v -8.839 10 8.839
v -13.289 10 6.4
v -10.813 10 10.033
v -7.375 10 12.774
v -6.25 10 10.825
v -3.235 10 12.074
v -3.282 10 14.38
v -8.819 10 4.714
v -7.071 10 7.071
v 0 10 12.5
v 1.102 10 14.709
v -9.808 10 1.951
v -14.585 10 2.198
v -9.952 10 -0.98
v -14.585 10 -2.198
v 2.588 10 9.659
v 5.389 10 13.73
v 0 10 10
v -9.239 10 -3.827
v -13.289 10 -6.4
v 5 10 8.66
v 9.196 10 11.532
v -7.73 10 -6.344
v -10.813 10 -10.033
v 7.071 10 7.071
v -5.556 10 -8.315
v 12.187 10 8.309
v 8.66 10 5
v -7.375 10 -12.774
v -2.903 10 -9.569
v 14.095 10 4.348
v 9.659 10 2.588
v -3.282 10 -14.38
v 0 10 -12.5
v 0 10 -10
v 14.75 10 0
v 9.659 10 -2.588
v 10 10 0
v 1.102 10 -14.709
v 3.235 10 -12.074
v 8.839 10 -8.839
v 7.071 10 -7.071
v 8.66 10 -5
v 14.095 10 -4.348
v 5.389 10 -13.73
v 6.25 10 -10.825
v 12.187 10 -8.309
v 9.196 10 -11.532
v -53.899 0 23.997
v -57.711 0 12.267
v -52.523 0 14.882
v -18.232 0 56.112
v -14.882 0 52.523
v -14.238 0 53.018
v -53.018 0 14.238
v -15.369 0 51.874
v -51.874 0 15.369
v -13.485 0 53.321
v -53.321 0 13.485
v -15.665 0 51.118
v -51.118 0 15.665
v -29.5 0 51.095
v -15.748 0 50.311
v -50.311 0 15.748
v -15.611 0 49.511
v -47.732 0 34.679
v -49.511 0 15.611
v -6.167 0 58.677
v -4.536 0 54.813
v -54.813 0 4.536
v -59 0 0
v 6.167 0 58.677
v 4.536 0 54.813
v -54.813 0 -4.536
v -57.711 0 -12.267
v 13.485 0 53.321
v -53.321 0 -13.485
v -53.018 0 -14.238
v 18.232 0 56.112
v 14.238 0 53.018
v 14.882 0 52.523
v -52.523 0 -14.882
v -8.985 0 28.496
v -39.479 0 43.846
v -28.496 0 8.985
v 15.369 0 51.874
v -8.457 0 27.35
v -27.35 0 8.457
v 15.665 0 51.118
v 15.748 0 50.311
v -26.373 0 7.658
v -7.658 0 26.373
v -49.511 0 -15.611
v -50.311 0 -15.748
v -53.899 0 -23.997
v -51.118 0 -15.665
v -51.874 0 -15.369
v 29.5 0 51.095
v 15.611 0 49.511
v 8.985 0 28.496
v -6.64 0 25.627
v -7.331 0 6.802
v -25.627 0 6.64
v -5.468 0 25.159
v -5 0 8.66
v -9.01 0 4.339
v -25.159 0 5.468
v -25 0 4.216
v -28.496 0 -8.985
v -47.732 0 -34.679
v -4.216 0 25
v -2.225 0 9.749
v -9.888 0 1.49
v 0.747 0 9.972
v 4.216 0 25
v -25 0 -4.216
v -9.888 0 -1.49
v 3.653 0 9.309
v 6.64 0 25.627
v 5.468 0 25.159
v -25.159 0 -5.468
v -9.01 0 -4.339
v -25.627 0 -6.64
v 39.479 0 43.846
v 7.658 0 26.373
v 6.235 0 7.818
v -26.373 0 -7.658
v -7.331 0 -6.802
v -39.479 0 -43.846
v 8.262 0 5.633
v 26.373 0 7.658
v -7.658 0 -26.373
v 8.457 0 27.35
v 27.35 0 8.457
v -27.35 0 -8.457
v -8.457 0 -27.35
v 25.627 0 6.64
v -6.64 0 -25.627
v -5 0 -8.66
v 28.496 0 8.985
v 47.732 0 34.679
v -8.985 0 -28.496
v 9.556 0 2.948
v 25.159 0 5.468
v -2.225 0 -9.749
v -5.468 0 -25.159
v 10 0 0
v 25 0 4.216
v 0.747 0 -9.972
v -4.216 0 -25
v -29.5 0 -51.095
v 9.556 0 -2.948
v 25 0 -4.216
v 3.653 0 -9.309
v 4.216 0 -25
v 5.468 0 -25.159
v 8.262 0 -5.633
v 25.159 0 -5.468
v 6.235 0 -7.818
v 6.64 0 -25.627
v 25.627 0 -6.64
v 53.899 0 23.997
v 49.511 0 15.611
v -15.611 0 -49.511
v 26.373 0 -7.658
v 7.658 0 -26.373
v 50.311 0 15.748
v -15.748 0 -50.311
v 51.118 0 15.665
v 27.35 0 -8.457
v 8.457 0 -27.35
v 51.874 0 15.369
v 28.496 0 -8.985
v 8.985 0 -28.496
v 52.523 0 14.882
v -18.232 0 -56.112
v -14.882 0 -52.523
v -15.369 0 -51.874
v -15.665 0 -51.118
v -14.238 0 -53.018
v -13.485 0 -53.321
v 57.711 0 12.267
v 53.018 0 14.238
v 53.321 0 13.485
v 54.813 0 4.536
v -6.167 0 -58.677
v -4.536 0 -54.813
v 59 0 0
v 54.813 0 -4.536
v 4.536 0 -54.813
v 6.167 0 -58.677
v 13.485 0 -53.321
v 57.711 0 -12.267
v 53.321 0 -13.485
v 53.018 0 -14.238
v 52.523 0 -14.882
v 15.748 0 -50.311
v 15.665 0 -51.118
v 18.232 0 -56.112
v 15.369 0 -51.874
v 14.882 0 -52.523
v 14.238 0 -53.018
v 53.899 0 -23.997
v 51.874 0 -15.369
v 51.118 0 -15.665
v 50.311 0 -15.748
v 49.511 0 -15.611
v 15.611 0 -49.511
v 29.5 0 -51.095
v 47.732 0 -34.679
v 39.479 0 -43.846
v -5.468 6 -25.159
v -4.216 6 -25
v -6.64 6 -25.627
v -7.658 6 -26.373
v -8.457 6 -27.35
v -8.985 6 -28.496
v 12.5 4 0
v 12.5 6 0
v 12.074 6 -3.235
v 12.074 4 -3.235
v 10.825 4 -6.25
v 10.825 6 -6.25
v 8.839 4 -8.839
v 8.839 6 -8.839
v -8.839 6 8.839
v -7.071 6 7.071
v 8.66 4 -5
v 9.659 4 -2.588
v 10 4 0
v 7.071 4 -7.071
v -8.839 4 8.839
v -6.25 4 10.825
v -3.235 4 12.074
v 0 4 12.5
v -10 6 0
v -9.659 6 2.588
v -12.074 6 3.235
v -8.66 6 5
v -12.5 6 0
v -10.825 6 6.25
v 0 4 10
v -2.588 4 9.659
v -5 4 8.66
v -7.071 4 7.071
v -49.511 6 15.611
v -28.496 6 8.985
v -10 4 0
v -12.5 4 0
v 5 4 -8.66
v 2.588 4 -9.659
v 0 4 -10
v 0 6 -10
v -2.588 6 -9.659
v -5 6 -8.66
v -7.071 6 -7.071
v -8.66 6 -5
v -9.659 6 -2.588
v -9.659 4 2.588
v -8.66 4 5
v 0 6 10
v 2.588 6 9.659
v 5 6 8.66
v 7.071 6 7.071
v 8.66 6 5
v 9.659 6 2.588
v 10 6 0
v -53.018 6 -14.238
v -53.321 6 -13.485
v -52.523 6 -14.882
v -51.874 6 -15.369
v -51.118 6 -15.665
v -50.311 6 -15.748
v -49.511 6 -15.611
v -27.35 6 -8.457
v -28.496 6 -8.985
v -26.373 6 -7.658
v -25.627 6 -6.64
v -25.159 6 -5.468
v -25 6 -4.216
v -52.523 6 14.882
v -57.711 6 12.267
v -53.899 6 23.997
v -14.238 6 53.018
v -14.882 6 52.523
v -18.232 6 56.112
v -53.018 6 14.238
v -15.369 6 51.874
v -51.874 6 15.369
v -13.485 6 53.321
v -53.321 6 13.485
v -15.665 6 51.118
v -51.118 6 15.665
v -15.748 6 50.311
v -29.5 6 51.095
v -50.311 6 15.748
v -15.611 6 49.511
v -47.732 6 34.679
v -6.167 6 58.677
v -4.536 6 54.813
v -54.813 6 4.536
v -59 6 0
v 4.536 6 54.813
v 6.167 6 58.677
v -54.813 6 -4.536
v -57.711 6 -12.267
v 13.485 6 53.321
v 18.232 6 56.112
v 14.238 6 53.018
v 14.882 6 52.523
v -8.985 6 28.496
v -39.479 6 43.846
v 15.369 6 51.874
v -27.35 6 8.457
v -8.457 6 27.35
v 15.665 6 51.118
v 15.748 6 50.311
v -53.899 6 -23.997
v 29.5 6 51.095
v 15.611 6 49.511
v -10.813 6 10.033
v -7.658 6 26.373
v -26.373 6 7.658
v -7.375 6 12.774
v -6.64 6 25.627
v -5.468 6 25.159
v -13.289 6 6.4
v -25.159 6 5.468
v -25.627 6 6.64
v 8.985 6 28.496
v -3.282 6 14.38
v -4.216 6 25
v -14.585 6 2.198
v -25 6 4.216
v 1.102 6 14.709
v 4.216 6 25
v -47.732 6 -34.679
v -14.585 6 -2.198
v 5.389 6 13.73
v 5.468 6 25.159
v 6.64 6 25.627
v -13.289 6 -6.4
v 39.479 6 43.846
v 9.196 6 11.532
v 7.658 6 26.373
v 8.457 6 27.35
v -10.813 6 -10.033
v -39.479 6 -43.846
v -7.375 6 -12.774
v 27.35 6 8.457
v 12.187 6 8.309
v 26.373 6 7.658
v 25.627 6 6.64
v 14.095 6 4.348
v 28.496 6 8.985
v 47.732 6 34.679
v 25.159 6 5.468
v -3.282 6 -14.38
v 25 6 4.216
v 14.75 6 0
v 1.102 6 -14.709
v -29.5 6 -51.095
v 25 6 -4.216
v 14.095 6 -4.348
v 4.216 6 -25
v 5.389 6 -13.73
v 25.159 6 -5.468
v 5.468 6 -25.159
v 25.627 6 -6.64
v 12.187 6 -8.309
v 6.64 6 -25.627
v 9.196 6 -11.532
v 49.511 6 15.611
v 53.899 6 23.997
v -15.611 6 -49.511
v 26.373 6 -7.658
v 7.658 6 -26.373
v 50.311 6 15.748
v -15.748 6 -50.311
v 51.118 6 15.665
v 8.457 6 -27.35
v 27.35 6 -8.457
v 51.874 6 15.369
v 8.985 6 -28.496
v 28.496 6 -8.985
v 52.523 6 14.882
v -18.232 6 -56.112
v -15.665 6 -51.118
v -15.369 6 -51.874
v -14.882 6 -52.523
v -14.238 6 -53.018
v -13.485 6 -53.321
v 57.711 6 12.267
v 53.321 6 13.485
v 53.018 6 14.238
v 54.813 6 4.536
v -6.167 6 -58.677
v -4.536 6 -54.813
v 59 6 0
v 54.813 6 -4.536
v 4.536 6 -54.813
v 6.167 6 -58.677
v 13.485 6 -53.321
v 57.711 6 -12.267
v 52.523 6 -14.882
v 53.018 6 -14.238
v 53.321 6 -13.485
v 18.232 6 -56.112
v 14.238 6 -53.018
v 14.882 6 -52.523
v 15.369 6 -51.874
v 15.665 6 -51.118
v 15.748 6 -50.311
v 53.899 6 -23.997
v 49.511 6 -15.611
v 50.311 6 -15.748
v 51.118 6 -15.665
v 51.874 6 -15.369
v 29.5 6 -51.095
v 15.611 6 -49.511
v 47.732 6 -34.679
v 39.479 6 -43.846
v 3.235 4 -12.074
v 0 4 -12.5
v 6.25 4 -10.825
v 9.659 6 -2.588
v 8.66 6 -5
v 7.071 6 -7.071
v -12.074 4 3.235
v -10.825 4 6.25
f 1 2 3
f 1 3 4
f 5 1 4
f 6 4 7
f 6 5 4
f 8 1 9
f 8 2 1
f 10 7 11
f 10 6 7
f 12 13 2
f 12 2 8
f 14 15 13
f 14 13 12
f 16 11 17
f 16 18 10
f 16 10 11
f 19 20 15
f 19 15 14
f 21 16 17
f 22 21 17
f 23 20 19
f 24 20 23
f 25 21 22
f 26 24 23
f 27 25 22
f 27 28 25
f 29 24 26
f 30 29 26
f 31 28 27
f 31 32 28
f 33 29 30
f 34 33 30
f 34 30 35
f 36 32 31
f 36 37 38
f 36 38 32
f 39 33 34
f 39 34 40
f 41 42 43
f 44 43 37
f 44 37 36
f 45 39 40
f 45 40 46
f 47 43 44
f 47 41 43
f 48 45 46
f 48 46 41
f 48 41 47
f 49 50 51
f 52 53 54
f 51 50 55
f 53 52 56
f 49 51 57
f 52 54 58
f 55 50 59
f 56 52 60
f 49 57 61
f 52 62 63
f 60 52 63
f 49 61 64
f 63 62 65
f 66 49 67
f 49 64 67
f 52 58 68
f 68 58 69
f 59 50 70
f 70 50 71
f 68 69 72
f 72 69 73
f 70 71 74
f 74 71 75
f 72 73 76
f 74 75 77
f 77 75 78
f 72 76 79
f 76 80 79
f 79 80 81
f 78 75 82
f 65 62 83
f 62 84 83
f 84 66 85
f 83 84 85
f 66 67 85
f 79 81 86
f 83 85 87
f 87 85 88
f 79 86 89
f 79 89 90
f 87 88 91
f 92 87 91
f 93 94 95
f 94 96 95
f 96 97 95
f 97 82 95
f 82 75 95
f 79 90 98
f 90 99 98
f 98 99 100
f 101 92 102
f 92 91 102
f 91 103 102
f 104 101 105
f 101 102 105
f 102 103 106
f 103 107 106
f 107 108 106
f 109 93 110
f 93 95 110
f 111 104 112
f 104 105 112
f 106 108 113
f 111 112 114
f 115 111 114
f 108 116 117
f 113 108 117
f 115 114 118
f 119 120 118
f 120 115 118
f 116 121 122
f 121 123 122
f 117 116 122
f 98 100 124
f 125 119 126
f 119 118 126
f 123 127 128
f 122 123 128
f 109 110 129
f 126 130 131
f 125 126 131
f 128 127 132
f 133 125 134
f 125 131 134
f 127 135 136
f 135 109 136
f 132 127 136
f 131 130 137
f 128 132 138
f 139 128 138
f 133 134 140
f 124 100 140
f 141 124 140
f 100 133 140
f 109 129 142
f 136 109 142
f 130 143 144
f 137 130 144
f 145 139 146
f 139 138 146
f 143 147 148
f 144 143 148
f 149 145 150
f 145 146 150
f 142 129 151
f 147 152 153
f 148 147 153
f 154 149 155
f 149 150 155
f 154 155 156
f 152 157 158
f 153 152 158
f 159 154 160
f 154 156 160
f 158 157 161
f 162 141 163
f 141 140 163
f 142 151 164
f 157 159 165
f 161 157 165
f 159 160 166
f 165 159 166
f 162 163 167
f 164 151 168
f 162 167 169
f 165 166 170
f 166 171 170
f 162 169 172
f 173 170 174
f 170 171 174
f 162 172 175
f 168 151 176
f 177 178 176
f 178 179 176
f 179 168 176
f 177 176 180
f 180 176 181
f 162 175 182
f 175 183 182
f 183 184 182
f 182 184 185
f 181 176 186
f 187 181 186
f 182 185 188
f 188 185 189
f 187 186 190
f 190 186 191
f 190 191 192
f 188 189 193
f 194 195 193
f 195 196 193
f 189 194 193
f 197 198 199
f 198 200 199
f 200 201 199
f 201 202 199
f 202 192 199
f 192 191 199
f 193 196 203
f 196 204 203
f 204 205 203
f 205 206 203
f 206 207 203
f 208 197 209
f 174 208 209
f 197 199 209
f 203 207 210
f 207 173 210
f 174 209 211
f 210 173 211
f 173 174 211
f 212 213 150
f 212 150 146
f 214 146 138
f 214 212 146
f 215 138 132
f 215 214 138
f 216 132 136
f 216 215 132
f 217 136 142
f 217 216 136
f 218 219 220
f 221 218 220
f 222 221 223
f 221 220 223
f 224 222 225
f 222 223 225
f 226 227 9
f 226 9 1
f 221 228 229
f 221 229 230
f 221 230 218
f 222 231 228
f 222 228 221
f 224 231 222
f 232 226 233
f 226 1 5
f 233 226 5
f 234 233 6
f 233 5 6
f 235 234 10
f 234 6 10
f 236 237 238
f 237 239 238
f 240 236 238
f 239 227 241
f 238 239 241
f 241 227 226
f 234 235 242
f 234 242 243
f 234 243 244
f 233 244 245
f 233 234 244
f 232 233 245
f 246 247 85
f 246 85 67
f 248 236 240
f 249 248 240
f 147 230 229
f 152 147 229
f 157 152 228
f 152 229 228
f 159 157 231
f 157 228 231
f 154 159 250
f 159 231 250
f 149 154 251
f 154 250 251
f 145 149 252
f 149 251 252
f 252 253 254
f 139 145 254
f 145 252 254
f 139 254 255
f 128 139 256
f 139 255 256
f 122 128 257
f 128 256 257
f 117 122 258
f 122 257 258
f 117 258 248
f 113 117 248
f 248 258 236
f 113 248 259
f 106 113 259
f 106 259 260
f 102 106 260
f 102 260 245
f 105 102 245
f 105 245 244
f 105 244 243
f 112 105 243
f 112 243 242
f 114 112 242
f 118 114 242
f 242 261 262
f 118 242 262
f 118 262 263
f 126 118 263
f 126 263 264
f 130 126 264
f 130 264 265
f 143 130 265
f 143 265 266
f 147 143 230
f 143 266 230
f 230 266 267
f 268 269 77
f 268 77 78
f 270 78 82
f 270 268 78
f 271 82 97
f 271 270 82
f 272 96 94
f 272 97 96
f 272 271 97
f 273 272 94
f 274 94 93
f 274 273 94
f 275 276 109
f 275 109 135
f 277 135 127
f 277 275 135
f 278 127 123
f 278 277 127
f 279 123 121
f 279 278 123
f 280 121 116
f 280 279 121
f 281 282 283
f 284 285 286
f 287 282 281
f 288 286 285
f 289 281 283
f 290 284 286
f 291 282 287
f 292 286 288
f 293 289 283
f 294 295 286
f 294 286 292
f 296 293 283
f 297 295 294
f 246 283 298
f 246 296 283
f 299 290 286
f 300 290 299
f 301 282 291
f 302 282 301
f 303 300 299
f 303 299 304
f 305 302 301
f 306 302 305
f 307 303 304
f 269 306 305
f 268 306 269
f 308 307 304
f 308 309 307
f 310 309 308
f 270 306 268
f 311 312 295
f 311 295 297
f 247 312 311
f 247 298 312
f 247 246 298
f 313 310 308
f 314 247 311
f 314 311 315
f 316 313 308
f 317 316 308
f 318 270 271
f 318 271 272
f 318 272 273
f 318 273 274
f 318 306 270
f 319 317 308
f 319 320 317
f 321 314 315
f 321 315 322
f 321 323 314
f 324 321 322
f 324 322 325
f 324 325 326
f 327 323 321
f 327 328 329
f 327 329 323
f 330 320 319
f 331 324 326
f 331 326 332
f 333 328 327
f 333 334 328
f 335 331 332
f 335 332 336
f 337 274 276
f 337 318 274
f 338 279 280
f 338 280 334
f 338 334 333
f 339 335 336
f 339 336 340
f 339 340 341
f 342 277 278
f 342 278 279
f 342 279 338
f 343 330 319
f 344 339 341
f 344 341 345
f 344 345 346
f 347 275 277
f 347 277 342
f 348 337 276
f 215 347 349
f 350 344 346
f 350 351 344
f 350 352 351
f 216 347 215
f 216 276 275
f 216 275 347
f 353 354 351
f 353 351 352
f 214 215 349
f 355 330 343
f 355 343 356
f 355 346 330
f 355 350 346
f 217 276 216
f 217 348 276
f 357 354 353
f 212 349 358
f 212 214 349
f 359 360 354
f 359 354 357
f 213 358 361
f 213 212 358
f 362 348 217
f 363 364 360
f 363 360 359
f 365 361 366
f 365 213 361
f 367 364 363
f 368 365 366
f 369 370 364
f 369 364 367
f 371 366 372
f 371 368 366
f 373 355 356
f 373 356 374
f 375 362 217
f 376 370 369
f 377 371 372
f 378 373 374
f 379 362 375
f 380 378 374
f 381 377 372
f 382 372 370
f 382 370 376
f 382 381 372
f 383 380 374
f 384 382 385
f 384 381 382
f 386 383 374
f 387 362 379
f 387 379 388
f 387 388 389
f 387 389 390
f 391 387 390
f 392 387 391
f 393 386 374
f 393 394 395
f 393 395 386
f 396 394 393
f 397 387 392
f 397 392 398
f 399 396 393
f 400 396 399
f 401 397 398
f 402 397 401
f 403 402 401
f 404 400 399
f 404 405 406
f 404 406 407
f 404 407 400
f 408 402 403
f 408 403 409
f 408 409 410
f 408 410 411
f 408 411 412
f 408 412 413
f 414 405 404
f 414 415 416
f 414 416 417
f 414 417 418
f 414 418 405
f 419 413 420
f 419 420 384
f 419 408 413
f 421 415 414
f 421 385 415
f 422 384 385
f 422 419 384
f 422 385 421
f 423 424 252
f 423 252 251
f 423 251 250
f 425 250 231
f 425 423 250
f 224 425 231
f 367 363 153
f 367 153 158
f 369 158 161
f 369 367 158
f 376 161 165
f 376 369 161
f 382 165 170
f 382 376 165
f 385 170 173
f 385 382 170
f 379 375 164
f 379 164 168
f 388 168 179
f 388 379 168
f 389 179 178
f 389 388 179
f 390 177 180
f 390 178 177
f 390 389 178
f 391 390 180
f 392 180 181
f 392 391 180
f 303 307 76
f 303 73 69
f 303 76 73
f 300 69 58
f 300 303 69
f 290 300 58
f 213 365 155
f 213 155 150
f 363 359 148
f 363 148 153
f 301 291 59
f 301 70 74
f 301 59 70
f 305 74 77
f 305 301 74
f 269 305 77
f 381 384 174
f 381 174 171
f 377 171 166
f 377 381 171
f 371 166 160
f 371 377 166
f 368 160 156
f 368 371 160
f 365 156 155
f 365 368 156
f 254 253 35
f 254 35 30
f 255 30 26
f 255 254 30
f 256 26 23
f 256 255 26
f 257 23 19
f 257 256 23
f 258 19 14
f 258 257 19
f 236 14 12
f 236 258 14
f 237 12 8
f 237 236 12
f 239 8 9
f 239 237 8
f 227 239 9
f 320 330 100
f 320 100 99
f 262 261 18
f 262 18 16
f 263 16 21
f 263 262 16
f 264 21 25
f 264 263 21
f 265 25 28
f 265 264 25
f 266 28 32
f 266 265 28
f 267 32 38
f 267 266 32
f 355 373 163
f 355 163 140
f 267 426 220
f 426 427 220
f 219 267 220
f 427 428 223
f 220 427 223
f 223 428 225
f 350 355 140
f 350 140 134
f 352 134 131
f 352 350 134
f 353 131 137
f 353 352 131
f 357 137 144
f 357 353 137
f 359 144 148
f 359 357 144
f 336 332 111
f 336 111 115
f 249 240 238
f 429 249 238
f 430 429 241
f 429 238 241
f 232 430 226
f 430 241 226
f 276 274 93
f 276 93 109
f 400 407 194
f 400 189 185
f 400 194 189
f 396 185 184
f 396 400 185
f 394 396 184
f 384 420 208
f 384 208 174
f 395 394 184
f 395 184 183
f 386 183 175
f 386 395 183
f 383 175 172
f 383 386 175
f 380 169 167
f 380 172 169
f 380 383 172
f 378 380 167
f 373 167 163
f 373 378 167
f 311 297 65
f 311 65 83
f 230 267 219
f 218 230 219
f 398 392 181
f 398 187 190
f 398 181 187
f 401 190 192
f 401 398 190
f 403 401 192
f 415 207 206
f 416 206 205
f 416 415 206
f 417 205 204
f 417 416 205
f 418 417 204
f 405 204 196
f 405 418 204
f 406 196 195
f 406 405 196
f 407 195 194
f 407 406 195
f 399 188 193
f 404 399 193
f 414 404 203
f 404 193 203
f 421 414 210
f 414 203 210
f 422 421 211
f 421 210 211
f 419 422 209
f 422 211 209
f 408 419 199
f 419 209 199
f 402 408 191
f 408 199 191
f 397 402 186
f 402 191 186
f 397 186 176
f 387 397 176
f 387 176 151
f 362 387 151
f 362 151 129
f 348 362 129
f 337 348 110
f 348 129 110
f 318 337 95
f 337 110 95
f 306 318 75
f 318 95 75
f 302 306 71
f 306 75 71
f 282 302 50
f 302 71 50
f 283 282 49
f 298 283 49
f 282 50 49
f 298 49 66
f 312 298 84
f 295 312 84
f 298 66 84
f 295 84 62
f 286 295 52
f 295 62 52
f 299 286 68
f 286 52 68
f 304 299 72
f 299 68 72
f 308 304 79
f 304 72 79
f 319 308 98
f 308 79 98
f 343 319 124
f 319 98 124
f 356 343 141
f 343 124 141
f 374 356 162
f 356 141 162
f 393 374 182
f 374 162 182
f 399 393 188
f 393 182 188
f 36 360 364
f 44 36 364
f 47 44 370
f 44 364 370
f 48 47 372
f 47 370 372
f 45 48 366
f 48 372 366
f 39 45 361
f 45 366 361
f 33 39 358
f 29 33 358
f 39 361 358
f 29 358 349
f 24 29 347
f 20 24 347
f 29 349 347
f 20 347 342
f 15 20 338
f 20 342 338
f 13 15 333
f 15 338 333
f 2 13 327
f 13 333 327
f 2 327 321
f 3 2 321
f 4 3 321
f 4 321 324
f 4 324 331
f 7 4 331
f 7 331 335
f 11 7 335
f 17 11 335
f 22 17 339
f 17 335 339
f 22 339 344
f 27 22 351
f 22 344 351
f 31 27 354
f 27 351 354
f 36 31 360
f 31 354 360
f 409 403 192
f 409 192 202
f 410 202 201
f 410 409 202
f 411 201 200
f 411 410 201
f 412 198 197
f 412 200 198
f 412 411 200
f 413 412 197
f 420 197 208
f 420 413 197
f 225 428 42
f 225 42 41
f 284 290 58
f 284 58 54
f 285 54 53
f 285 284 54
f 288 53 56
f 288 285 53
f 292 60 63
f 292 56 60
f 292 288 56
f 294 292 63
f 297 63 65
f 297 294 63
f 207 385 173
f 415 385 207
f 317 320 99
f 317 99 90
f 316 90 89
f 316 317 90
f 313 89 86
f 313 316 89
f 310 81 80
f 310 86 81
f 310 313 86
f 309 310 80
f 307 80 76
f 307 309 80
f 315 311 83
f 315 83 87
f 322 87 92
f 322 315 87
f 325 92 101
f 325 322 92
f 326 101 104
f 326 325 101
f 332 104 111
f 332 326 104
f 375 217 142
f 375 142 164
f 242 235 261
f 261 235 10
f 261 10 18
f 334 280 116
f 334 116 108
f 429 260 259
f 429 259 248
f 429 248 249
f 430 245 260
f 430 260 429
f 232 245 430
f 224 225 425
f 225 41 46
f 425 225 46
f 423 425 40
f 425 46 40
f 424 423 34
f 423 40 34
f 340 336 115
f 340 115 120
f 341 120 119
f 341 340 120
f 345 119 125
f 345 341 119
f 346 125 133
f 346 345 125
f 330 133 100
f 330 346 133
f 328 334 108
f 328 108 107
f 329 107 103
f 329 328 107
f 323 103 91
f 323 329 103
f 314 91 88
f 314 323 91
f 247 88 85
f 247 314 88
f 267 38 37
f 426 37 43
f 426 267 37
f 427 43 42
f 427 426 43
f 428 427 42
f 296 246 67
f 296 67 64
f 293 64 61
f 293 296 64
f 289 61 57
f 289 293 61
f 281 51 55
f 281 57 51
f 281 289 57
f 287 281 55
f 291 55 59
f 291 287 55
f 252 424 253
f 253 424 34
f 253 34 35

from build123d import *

# Parameters (mm, degrees)
SKETCH1_R           = 59
BOSS_EXTRUDE1_DEPTH = 6
CUT_EXTRUDE4_DEPTH  = 84.654049513
CIRPATTERN2_COUNT   = 4
SKETCH4_R           = 10
CUT_EXTRUDE6_DEPTH  = 10
BOSS_EXTRUDE2_START = 4
SKETCH5_R           = 14.75
SKETCH5_R_2         = 10
BOSS_EXTRUDE2_DEPTH = 4
CUT_EXTRUDE8_DEPTH  = 6
CUT_EXTRUDE9_START  = -4
CUT_EXTRUDE9_DEPTH  = 2
CIRPATTERN3_COUNT   = 2


with BuildPart() as part:
    # Sketch1 → Boss-Extrude1 (new body)
    with BuildSketch(Plane(origin=(0, 0, 0), x_dir=(1, 0, 0), z_dir=(0, 1, 0))):
        Circle(SKETCH1_R)
    extrude(amount=BOSS_EXTRUDE1_DEPTH)

    # Sketch2<3> → Cut-Extrude4 (cut, through all)
    with BuildSketch(Plane(origin=(0, 6, 0), x_dir=(1, 0, 0), z_dir=(0, 1, 0))):
        with BuildLine():
            Line((-15.610657267, 49.510679451), (-8.984902794, 28.496471002))
            ThreePointArc((-8.984902794, 28.496471002), (-7.172866282, 25.967776979), (-4.216318041, 25))
            Line((-4.216318041, 25), (4.216318041, 25))
            ThreePointArc((4.216318041, 25), (7.172866282, 25.967776979), (8.984902794, 28.496471002))
            Line((8.984902794, 28.496471002), (15.610657267, 49.510679451))
            ThreePointArc((15.610657267, 49.510679451), (15.369454974, 51.874258292), (13.485054862, 53.321227437))
            ThreePointArc((13.485054862, 53.321227437), (0, 55), (-13.485054862, 53.321227437))
            ThreePointArc((-13.485054862, 53.321227437), (-15.369454974, 51.874258292), (-15.610657267, 49.510679451))
        make_face()
    cut_extrude4 = extrude(amount=-CUT_EXTRUDE4_DEPTH, mode=Mode.SUBTRACT)

    # CirPattern2: Cut-Extrude4 ×4 about axis
    cirpattern2_axis = Axis((0, 6, 0), (0, -1, 0))
    for i in range(1, CIRPATTERN2_COUNT):
        add(cut_extrude4.rotate(cirpattern2_axis, i * 360 / CIRPATTERN2_COUNT), mode=Mode.SUBTRACT)

    # Sketch4 → Cut-Extrude6 (cut)
    with BuildSketch(Plane(origin=(0, 6, 0), x_dir=(1, 0, 0), z_dir=(0, 1, 0))):
        Circle(SKETCH4_R)
    extrude(amount=-CUT_EXTRUDE6_DEPTH, mode=Mode.SUBTRACT)

    # Sketch5 → Boss-Extrude2 (add)
    with BuildSketch(Plane(origin=(0, 6, 0), x_dir=(1, 0, 0), z_dir=(0, 1, 0)).offset(BOSS_EXTRUDE2_START)):
        Circle(SKETCH5_R)
        Circle(SKETCH5_R_2, mode=Mode.SUBTRACT)
    extrude(amount=-BOSS_EXTRUDE2_DEPTH)

    # Sketch6 → Cut-Extrude8 (cut)
    with BuildSketch(Plane(origin=(0, 10, 0), x_dir=(1, 0, 0), z_dir=(0, 1, 0))):
        with BuildLine():
            Line((0, 12.5), (0, 10))
            ThreePointArc((0, 10), (3.826834324, 9.238795325), (7.071067812, 7.071067812))
            Line((7.071067812, 7.071067812), (8.838834765, 8.838834765))
            ThreePointArc((8.838834765, 8.838834765), (4.783542905, 11.548494156), (0, 12.5))
        make_face()
    cut_extrude8 = extrude(amount=-CUT_EXTRUDE8_DEPTH, mode=Mode.SUBTRACT)

    # Sketch6<4> → Cut-Extrude9 (cut)
    with BuildSketch(Plane(origin=(0, 10, 0), x_dir=(1, 0, 0), z_dir=(0, 1, 0)).offset(CUT_EXTRUDE9_START)):
        with BuildLine():
            Line((8.838834765, 8.838834765), (7.071067812, 7.071067812))
            ThreePointArc((7.071067812, 7.071067812), (9.238795325, 3.826834324), (10, 0))
            Line((10, 0), (12.5, 0))
            ThreePointArc((12.5, 0), (11.548494156, 4.783542905), (8.838834765, 8.838834765))
        make_face()
    cut_extrude9 = extrude(amount=-CUT_EXTRUDE9_DEPTH, mode=Mode.SUBTRACT)

    # CirPattern3: Cut-Extrude8, Cut-Extrude9 ×2 about axis
    cirpattern3_axis = Axis((0, -4, 0), (0, 1, 0))
    add([cut_extrude8.rotate(cirpattern3_axis, i * 360 / CIRPATTERN3_COUNT) for i in range(1, CIRPATTERN3_COUNT)], mode=Mode.SUBTRACT)
    add([cut_extrude9.rotate(cirpattern3_axis, i * 360 / CIRPATTERN3_COUNT) for i in range(1, CIRPATTERN3_COUNT)], mode=Mode.SUBTRACT)


solid = part.part
